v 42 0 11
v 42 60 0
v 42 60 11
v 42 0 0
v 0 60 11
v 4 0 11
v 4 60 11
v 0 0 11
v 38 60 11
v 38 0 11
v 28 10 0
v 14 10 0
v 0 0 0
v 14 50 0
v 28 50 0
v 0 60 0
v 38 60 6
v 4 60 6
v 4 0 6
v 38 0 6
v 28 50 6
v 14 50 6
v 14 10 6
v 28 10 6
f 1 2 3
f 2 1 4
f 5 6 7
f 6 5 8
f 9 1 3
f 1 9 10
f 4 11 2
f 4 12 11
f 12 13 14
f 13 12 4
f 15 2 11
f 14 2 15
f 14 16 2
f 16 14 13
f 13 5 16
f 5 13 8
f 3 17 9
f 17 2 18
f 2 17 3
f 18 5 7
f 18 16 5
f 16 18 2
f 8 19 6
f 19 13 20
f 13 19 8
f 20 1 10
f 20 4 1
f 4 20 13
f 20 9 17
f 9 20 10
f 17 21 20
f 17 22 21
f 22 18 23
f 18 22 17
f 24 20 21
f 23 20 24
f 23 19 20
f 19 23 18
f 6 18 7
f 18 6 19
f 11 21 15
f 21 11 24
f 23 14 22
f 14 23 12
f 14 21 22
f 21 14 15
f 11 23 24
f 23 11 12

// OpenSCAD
/*
 * name: Askvoll bedframe foot padding
 * author: rooter@kyberian.net
 * license: MIT
 */

module bedframe_foot(thickness = 4, length = 60, brim_height = 5,
                     floor_distance = 6, wall_thickness = 34, ) {
  if (!floor_distance) {
    floor_distance = thickness;
  }
  difference() {
    cube([
      wall_thickness + 2 * thickness, length, floor_distance + brim_height
    ]);
    translate([ thickness, 0, floor_distance ]) {
      cube([ wall_thickness, length, brim_height ]);
    }
    translate([ (wall_thickness + 2 * thickness) / 2, length / 2, 0 ]) {
      cube([ 14, 40, floor_distance * 2 ], center = true);
    }
  }
}

bedframe_foot();
